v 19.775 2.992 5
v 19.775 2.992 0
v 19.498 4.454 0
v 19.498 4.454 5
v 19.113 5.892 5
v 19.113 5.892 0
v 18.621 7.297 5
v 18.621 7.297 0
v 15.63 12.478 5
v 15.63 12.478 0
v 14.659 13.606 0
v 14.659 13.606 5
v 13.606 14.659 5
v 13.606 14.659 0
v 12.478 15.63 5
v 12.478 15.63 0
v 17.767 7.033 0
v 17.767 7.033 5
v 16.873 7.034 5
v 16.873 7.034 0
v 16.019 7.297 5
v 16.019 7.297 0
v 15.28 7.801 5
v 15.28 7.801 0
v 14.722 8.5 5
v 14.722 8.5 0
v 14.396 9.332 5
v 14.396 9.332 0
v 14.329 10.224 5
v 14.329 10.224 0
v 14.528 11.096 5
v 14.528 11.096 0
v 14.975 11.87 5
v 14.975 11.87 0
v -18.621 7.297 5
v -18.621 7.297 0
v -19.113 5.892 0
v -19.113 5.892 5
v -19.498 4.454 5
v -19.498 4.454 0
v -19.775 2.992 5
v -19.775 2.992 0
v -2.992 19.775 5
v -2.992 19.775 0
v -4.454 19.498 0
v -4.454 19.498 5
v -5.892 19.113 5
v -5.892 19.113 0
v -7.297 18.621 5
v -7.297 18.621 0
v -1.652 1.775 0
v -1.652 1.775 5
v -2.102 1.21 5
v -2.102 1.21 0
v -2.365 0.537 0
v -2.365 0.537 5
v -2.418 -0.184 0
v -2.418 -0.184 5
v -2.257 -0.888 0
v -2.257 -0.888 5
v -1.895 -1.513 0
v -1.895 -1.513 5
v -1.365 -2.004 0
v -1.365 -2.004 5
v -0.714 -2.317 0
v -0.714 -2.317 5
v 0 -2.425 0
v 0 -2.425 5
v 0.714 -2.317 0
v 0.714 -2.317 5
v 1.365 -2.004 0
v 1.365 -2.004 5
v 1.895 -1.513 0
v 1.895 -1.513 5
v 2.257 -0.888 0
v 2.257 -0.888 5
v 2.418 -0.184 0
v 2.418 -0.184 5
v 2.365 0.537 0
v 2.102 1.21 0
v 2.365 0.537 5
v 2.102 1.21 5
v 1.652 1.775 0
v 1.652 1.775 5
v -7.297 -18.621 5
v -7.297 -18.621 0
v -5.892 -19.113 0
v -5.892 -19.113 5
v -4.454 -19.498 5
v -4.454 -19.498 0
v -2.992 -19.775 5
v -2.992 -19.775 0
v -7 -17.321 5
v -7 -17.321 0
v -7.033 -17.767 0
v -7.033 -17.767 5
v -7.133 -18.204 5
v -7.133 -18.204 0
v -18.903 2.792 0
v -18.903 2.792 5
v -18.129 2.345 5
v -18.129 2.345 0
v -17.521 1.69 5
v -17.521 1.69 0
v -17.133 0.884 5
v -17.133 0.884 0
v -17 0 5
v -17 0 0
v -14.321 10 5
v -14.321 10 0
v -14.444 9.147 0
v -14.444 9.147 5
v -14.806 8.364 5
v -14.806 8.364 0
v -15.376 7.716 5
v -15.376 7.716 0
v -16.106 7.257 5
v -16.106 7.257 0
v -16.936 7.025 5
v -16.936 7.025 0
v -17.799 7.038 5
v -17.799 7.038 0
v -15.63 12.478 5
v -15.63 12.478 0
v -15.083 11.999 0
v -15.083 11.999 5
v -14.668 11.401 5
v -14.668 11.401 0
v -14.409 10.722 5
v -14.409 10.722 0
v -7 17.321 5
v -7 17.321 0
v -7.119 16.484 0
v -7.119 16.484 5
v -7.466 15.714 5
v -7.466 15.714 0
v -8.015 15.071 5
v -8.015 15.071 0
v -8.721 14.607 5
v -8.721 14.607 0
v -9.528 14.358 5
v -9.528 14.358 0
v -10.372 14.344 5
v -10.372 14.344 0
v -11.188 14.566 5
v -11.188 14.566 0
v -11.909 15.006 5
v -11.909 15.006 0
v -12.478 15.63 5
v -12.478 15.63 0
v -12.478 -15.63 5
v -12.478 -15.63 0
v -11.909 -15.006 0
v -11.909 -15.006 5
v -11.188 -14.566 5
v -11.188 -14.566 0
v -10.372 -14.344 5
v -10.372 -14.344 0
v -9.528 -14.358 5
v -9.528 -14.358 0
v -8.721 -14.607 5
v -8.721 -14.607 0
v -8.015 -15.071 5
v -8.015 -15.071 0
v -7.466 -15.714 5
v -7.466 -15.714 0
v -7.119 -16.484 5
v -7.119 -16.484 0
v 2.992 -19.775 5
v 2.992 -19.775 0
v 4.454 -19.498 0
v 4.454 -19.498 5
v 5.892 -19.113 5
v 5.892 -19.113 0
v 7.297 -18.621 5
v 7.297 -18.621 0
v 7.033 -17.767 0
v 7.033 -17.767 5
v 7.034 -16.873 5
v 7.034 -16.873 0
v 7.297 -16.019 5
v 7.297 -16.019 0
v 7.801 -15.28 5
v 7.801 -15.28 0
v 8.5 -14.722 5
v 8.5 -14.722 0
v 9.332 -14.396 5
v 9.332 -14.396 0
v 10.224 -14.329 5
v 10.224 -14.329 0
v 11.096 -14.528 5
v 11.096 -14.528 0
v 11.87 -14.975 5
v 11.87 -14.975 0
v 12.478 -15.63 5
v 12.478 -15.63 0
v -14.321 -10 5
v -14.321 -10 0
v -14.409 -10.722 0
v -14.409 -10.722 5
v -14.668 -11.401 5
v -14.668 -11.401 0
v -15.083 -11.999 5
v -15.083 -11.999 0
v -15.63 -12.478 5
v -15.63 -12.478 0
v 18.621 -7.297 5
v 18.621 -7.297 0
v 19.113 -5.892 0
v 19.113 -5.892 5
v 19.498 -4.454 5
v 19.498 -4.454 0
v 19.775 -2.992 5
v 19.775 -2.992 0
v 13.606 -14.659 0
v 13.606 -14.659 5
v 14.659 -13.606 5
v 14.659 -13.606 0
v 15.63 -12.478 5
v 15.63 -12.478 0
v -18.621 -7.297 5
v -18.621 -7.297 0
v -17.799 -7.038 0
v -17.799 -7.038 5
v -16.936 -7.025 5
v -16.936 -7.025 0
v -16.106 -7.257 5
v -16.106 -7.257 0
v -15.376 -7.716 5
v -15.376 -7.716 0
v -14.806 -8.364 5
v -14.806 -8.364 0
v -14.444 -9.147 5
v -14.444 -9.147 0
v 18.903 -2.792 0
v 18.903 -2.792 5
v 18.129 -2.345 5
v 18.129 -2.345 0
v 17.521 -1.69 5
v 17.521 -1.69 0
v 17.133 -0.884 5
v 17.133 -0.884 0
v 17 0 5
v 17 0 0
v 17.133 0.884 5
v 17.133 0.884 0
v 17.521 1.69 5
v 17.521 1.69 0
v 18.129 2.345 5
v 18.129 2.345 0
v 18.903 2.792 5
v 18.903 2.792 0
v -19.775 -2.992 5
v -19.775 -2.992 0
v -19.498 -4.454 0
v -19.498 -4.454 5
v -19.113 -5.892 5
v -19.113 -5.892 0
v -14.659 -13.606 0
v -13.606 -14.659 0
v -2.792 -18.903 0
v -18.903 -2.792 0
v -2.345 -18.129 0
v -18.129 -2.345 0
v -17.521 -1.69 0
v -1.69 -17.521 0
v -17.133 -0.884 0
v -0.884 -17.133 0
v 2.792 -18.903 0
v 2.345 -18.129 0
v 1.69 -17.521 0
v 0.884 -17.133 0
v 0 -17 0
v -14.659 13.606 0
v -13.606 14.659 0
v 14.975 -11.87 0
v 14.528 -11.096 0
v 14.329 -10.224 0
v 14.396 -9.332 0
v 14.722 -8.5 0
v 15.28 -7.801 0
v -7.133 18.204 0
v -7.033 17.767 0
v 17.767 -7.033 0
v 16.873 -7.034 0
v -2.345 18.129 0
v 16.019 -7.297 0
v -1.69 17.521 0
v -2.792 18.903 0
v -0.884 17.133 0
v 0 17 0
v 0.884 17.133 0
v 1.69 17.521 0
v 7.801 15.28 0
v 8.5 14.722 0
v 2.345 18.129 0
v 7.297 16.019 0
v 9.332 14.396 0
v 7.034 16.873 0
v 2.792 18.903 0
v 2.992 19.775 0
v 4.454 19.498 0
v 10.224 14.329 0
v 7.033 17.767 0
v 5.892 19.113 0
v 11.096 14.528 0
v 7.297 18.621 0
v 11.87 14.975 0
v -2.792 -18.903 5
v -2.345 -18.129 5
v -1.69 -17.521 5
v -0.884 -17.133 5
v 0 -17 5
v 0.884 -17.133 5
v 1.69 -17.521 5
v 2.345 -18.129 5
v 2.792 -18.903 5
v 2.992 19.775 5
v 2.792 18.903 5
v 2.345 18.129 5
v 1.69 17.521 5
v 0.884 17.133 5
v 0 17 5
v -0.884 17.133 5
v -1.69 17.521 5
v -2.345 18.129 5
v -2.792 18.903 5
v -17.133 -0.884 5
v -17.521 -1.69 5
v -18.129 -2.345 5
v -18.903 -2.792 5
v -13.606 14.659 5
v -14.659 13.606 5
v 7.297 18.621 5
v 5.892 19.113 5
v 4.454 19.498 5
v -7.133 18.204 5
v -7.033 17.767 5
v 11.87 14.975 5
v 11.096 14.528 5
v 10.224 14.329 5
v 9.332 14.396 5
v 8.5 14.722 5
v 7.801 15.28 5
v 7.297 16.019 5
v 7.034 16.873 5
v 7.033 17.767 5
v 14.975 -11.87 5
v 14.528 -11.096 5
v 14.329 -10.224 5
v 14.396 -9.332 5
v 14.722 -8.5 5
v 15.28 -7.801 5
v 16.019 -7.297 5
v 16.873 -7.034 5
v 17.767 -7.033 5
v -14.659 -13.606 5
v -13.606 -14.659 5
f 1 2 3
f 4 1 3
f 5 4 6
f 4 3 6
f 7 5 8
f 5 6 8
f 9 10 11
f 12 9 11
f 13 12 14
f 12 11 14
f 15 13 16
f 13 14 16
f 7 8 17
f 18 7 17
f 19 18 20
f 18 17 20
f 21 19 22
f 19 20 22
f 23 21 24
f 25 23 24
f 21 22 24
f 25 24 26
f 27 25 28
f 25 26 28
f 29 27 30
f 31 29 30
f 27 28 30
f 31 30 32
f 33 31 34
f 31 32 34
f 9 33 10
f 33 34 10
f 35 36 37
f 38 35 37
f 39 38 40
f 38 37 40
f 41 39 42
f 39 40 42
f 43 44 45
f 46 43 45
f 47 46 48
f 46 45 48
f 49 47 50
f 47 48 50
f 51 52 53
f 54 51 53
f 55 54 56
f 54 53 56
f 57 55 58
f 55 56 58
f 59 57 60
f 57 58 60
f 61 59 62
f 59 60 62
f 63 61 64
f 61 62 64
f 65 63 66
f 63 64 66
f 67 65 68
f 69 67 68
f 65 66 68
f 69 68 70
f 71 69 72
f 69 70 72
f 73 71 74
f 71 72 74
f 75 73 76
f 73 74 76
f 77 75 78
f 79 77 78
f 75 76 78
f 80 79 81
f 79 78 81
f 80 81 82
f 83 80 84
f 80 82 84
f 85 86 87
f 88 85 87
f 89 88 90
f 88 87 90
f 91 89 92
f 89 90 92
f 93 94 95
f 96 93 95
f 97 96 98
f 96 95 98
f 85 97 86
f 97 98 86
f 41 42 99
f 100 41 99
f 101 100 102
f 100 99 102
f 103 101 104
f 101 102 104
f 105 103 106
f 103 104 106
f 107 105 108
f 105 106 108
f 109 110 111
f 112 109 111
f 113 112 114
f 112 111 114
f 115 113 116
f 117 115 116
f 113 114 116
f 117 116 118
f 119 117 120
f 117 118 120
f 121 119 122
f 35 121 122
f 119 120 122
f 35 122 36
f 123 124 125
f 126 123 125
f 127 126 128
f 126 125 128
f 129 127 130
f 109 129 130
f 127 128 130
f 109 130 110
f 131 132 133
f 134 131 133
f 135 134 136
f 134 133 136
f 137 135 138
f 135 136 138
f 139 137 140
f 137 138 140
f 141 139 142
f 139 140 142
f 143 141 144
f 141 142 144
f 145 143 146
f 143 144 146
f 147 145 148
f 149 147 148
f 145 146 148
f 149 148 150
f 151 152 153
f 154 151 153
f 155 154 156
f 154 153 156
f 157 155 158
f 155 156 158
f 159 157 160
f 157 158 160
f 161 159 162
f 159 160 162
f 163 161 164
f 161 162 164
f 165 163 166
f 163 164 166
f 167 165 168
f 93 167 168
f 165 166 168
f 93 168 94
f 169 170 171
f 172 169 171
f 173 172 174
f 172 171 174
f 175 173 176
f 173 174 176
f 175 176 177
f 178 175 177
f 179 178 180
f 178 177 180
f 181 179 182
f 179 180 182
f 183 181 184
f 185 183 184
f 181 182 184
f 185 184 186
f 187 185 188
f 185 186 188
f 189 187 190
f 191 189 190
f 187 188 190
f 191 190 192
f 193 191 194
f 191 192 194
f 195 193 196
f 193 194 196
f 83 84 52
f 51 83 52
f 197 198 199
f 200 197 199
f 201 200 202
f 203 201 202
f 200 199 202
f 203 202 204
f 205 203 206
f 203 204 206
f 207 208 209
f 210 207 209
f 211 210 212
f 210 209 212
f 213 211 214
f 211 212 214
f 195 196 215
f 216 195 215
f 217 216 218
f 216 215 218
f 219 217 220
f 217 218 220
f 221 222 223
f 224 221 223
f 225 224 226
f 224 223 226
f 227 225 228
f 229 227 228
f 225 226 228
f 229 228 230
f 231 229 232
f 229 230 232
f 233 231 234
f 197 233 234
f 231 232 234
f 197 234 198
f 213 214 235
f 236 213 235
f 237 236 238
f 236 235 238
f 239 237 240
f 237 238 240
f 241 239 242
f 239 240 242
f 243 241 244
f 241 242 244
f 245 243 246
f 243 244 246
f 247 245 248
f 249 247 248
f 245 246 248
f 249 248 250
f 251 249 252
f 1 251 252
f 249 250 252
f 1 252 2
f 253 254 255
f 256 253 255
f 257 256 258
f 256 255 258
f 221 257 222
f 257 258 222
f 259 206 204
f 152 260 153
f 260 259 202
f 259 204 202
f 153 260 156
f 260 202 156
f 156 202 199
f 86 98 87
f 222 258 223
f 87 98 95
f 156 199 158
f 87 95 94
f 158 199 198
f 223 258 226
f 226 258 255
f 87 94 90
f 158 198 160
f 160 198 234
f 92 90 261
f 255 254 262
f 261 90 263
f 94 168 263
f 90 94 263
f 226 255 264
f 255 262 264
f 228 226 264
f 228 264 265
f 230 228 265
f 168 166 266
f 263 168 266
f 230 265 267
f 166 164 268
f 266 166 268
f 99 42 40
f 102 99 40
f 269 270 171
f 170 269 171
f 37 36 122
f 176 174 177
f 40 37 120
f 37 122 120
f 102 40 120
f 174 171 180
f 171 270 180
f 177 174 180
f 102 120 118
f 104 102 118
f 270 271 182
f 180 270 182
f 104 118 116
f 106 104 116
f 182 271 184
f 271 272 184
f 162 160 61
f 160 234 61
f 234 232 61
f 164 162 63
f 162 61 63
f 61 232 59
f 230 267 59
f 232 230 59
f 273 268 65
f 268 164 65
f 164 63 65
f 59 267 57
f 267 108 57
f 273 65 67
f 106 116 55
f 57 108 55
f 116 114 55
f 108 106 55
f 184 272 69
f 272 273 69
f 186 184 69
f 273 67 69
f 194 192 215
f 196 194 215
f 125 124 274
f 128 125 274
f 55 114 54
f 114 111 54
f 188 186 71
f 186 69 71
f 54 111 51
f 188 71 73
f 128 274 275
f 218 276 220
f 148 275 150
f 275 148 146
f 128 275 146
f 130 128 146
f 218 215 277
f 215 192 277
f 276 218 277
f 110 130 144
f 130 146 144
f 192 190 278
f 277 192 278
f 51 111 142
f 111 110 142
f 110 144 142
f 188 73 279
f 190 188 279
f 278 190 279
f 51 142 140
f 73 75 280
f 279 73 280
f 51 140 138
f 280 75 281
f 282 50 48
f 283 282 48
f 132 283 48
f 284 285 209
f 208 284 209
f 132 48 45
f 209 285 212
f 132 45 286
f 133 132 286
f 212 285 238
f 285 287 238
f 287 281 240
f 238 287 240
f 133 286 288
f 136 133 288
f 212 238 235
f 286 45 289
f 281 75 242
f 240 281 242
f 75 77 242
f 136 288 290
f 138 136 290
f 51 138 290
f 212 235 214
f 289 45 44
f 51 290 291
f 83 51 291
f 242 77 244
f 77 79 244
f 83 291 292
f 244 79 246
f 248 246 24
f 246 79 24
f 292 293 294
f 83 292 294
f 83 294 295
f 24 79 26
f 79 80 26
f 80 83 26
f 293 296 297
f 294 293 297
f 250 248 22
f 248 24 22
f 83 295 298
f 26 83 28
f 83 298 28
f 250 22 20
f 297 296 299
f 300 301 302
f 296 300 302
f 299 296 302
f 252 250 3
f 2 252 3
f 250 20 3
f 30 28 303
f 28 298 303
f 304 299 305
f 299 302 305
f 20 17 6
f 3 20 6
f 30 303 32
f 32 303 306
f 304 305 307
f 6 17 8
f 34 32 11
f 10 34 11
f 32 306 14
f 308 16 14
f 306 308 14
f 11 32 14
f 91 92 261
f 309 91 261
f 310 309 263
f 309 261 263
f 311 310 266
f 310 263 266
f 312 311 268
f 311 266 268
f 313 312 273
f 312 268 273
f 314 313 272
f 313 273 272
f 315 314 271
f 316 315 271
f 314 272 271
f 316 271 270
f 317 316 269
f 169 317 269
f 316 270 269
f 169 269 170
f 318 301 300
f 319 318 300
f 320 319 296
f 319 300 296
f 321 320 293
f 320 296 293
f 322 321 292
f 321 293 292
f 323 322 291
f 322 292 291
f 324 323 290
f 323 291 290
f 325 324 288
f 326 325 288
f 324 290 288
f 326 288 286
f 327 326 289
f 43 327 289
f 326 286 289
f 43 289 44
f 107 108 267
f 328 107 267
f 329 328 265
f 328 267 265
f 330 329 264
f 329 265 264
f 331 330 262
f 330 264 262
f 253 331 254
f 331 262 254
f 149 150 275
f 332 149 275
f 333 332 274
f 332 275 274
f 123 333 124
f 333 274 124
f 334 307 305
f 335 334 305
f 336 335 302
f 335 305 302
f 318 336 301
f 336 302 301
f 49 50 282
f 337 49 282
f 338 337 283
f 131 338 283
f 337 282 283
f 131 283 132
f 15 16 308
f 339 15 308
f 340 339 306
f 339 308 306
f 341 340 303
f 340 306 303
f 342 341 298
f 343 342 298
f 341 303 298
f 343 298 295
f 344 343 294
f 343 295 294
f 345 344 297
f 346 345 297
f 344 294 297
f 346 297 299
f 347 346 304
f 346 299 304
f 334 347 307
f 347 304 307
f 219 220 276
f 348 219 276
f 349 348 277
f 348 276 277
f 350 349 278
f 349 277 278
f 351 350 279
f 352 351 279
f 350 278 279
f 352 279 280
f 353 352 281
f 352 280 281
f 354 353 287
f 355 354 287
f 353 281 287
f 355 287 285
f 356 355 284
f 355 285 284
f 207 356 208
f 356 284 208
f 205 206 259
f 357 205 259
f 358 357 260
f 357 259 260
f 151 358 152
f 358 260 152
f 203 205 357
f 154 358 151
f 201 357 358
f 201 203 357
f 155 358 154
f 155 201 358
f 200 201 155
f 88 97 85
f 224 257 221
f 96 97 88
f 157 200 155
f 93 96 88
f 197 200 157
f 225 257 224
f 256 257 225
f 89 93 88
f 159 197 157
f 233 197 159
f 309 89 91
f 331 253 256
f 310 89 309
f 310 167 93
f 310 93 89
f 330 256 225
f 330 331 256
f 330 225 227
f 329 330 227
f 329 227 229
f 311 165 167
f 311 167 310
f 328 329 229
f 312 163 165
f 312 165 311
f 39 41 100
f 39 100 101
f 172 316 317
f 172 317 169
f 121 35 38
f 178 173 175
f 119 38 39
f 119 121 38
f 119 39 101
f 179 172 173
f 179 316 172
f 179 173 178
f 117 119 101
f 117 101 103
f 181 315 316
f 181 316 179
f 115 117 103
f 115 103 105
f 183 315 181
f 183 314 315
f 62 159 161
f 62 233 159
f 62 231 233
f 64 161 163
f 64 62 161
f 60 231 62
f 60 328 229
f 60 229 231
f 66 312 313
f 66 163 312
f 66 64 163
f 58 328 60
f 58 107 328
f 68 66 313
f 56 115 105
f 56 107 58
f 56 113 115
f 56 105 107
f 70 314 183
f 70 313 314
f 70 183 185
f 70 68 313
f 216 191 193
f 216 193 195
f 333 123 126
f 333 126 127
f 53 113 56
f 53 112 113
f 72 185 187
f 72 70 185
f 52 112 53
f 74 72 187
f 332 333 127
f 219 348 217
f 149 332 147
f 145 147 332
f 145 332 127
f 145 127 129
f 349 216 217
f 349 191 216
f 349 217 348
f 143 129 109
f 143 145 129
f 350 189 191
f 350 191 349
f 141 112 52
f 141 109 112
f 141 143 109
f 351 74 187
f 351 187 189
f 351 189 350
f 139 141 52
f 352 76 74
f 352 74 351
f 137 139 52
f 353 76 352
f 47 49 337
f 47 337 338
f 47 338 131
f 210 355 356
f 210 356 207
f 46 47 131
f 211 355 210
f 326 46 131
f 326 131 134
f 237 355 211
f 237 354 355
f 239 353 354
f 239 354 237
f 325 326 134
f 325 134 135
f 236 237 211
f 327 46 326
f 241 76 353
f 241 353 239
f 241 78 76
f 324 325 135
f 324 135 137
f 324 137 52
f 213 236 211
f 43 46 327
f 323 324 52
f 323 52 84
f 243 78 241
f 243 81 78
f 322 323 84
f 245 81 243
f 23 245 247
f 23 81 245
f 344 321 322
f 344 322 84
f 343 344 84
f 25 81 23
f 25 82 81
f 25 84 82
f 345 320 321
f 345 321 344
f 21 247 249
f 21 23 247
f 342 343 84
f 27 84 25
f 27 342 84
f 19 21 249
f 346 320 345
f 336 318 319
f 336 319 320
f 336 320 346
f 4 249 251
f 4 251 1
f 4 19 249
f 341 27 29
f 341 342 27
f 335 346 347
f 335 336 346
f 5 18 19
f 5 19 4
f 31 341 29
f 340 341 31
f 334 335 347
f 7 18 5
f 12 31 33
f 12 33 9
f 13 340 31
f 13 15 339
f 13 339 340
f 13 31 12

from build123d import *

# Parameters (mm, degrees)
F1_DEPTH = 5
F3_DEPTH = 5.001


with BuildPart() as f1:
    # F0 (on Top) → F1 (new body)
    with BuildSketch(Plane.XY):
        with BuildLine():
            ThreePointArc((19.775, -2.9915506013), (17, 0), (19.775, 2.9915506013))
            ThreePointArc((19.775, 2.9915506013), (19.3185165258, 5.1763809021), (18.6214276605, 7.2967411826))
            ThreePointArc((18.6214276605, 7.2967411826), (14.7224318643, 8.5), (15.6298770592, 12.4782588174))
            ThreePointArc((15.6298770592, 12.4782588174), (14.1421356237, 14.1421356237), (12.4782588174, 15.6298770592))
            ThreePointArc((12.4782588174, 15.6298770592), (8.5, 14.7224318643), (7.2967411826, 18.6214276605))
            ThreePointArc((7.2967411826, 18.6214276605), (5.176380902, 19.3185165258), (2.9915506013, 19.775))
            ThreePointArc((2.9915506013, 19.775), (0, 17), (-2.9915506013, 19.775))
            ThreePointArc((-2.9915506013, 19.775), (-5.176380902, 19.3185165258), (-7.2967411826, 18.6214276605))
            ThreePointArc((-7.2967411826, 18.6214276605), (-7.075125947, 17.9876750517), (-7, 17.3205080757))
            ThreePointArc((-7, 17.3205080757), (-9.1153465233, 14.4539093549), (-12.4782588174, 15.6298770592))
            ThreePointArc((-12.4782588174, 15.6298770592), (-14.1421356237, 14.1421356237), (-15.6298770592, 12.4782588174))
            ThreePointArc((-15.6298770592, 12.4782588174), (-14.6679722089, 11.401446922), (-14.3205080757, 10))
            ThreePointArc((-14.3205080757, 10), (-15.7240680916, 7.4600434301), (-18.6214276605, 7.2967411826))
            ThreePointArc((-18.6214276605, 7.2967411826), (-19.3185165258, 5.1763809021), (-19.775, 2.9915506013))
            ThreePointArc((-19.775, 2.9915506013), (-17.8005682552, 2.0402205763), (-17, 0))
            ThreePointArc((-17, 0), (-17.8005682552, -2.0402205763), (-19.775, -2.9915506013))
            ThreePointArc((-19.775, -2.9915506013), (-19.3185165258, -5.1763809021), (-18.6214276605, -7.2967411826))
            ThreePointArc((-18.6214276605, -7.2967411826), (-15.7240680916, -7.4600434301), (-14.3205080757, -10))
            ThreePointArc((-14.3205080757, -10), (-14.6679722089, -11.401446922), (-15.6298770592, -12.4782588174))
            ThreePointArc((-15.6298770592, -12.4782588174), (-14.1421356237, -14.1421356237), (-12.4782588174, -15.6298770592))
            ThreePointArc((-12.4782588174, -15.6298770592), (-9.1153465233, -14.4539093549), (-7, -17.3205080757))
            ThreePointArc((-7, -17.3205080757), (-7.075125947, -17.9876750517), (-7.2967411826, -18.6214276605))
            ThreePointArc((-7.2967411826, -18.6214276605), (-5.176380902, -19.3185165258), (-2.9915506013, -19.775))
            ThreePointArc((-2.9915506013, -19.775), (0, -17), (2.9915506013, -19.775))
            ThreePointArc((2.9915506013, -19.775), (5.176380902, -19.3185165258), (7.2967411826, -18.6214276605))
            ThreePointArc((7.2967411826, -18.6214276605), (8.5, -14.7224318643), (12.4782588174, -15.6298770592))
            ThreePointArc((12.4782588174, -15.6298770592), (14.1421356237, -14.1421356237), (15.6298770592, -12.4782588174))
            ThreePointArc((15.6298770592, -12.4782588174), (14.7224318643, -8.5), (18.6214276605, -7.2967411826))
            ThreePointArc((18.6214276605, -7.2967411826), (19.3185165258, -5.1763809021), (19.775, -2.9915506013))
        make_face()
    extrude(amount=F1_DEPTH)

    # F2 (on face) → F3 (cut, through all)
    with BuildSketch(Plane.XY.offset(5)):
        with BuildLine():
            Line((1.6522711642, 1.775), (-1.6522711642, 1.775))
            ThreePointArc((-1.6522711642, 1.775), (0, -2.425), (1.6522711642, 1.775))
        make_face()
    extrude(amount=-F3_DEPTH, mode=Mode.SUBTRACT)


solid = f1.part
